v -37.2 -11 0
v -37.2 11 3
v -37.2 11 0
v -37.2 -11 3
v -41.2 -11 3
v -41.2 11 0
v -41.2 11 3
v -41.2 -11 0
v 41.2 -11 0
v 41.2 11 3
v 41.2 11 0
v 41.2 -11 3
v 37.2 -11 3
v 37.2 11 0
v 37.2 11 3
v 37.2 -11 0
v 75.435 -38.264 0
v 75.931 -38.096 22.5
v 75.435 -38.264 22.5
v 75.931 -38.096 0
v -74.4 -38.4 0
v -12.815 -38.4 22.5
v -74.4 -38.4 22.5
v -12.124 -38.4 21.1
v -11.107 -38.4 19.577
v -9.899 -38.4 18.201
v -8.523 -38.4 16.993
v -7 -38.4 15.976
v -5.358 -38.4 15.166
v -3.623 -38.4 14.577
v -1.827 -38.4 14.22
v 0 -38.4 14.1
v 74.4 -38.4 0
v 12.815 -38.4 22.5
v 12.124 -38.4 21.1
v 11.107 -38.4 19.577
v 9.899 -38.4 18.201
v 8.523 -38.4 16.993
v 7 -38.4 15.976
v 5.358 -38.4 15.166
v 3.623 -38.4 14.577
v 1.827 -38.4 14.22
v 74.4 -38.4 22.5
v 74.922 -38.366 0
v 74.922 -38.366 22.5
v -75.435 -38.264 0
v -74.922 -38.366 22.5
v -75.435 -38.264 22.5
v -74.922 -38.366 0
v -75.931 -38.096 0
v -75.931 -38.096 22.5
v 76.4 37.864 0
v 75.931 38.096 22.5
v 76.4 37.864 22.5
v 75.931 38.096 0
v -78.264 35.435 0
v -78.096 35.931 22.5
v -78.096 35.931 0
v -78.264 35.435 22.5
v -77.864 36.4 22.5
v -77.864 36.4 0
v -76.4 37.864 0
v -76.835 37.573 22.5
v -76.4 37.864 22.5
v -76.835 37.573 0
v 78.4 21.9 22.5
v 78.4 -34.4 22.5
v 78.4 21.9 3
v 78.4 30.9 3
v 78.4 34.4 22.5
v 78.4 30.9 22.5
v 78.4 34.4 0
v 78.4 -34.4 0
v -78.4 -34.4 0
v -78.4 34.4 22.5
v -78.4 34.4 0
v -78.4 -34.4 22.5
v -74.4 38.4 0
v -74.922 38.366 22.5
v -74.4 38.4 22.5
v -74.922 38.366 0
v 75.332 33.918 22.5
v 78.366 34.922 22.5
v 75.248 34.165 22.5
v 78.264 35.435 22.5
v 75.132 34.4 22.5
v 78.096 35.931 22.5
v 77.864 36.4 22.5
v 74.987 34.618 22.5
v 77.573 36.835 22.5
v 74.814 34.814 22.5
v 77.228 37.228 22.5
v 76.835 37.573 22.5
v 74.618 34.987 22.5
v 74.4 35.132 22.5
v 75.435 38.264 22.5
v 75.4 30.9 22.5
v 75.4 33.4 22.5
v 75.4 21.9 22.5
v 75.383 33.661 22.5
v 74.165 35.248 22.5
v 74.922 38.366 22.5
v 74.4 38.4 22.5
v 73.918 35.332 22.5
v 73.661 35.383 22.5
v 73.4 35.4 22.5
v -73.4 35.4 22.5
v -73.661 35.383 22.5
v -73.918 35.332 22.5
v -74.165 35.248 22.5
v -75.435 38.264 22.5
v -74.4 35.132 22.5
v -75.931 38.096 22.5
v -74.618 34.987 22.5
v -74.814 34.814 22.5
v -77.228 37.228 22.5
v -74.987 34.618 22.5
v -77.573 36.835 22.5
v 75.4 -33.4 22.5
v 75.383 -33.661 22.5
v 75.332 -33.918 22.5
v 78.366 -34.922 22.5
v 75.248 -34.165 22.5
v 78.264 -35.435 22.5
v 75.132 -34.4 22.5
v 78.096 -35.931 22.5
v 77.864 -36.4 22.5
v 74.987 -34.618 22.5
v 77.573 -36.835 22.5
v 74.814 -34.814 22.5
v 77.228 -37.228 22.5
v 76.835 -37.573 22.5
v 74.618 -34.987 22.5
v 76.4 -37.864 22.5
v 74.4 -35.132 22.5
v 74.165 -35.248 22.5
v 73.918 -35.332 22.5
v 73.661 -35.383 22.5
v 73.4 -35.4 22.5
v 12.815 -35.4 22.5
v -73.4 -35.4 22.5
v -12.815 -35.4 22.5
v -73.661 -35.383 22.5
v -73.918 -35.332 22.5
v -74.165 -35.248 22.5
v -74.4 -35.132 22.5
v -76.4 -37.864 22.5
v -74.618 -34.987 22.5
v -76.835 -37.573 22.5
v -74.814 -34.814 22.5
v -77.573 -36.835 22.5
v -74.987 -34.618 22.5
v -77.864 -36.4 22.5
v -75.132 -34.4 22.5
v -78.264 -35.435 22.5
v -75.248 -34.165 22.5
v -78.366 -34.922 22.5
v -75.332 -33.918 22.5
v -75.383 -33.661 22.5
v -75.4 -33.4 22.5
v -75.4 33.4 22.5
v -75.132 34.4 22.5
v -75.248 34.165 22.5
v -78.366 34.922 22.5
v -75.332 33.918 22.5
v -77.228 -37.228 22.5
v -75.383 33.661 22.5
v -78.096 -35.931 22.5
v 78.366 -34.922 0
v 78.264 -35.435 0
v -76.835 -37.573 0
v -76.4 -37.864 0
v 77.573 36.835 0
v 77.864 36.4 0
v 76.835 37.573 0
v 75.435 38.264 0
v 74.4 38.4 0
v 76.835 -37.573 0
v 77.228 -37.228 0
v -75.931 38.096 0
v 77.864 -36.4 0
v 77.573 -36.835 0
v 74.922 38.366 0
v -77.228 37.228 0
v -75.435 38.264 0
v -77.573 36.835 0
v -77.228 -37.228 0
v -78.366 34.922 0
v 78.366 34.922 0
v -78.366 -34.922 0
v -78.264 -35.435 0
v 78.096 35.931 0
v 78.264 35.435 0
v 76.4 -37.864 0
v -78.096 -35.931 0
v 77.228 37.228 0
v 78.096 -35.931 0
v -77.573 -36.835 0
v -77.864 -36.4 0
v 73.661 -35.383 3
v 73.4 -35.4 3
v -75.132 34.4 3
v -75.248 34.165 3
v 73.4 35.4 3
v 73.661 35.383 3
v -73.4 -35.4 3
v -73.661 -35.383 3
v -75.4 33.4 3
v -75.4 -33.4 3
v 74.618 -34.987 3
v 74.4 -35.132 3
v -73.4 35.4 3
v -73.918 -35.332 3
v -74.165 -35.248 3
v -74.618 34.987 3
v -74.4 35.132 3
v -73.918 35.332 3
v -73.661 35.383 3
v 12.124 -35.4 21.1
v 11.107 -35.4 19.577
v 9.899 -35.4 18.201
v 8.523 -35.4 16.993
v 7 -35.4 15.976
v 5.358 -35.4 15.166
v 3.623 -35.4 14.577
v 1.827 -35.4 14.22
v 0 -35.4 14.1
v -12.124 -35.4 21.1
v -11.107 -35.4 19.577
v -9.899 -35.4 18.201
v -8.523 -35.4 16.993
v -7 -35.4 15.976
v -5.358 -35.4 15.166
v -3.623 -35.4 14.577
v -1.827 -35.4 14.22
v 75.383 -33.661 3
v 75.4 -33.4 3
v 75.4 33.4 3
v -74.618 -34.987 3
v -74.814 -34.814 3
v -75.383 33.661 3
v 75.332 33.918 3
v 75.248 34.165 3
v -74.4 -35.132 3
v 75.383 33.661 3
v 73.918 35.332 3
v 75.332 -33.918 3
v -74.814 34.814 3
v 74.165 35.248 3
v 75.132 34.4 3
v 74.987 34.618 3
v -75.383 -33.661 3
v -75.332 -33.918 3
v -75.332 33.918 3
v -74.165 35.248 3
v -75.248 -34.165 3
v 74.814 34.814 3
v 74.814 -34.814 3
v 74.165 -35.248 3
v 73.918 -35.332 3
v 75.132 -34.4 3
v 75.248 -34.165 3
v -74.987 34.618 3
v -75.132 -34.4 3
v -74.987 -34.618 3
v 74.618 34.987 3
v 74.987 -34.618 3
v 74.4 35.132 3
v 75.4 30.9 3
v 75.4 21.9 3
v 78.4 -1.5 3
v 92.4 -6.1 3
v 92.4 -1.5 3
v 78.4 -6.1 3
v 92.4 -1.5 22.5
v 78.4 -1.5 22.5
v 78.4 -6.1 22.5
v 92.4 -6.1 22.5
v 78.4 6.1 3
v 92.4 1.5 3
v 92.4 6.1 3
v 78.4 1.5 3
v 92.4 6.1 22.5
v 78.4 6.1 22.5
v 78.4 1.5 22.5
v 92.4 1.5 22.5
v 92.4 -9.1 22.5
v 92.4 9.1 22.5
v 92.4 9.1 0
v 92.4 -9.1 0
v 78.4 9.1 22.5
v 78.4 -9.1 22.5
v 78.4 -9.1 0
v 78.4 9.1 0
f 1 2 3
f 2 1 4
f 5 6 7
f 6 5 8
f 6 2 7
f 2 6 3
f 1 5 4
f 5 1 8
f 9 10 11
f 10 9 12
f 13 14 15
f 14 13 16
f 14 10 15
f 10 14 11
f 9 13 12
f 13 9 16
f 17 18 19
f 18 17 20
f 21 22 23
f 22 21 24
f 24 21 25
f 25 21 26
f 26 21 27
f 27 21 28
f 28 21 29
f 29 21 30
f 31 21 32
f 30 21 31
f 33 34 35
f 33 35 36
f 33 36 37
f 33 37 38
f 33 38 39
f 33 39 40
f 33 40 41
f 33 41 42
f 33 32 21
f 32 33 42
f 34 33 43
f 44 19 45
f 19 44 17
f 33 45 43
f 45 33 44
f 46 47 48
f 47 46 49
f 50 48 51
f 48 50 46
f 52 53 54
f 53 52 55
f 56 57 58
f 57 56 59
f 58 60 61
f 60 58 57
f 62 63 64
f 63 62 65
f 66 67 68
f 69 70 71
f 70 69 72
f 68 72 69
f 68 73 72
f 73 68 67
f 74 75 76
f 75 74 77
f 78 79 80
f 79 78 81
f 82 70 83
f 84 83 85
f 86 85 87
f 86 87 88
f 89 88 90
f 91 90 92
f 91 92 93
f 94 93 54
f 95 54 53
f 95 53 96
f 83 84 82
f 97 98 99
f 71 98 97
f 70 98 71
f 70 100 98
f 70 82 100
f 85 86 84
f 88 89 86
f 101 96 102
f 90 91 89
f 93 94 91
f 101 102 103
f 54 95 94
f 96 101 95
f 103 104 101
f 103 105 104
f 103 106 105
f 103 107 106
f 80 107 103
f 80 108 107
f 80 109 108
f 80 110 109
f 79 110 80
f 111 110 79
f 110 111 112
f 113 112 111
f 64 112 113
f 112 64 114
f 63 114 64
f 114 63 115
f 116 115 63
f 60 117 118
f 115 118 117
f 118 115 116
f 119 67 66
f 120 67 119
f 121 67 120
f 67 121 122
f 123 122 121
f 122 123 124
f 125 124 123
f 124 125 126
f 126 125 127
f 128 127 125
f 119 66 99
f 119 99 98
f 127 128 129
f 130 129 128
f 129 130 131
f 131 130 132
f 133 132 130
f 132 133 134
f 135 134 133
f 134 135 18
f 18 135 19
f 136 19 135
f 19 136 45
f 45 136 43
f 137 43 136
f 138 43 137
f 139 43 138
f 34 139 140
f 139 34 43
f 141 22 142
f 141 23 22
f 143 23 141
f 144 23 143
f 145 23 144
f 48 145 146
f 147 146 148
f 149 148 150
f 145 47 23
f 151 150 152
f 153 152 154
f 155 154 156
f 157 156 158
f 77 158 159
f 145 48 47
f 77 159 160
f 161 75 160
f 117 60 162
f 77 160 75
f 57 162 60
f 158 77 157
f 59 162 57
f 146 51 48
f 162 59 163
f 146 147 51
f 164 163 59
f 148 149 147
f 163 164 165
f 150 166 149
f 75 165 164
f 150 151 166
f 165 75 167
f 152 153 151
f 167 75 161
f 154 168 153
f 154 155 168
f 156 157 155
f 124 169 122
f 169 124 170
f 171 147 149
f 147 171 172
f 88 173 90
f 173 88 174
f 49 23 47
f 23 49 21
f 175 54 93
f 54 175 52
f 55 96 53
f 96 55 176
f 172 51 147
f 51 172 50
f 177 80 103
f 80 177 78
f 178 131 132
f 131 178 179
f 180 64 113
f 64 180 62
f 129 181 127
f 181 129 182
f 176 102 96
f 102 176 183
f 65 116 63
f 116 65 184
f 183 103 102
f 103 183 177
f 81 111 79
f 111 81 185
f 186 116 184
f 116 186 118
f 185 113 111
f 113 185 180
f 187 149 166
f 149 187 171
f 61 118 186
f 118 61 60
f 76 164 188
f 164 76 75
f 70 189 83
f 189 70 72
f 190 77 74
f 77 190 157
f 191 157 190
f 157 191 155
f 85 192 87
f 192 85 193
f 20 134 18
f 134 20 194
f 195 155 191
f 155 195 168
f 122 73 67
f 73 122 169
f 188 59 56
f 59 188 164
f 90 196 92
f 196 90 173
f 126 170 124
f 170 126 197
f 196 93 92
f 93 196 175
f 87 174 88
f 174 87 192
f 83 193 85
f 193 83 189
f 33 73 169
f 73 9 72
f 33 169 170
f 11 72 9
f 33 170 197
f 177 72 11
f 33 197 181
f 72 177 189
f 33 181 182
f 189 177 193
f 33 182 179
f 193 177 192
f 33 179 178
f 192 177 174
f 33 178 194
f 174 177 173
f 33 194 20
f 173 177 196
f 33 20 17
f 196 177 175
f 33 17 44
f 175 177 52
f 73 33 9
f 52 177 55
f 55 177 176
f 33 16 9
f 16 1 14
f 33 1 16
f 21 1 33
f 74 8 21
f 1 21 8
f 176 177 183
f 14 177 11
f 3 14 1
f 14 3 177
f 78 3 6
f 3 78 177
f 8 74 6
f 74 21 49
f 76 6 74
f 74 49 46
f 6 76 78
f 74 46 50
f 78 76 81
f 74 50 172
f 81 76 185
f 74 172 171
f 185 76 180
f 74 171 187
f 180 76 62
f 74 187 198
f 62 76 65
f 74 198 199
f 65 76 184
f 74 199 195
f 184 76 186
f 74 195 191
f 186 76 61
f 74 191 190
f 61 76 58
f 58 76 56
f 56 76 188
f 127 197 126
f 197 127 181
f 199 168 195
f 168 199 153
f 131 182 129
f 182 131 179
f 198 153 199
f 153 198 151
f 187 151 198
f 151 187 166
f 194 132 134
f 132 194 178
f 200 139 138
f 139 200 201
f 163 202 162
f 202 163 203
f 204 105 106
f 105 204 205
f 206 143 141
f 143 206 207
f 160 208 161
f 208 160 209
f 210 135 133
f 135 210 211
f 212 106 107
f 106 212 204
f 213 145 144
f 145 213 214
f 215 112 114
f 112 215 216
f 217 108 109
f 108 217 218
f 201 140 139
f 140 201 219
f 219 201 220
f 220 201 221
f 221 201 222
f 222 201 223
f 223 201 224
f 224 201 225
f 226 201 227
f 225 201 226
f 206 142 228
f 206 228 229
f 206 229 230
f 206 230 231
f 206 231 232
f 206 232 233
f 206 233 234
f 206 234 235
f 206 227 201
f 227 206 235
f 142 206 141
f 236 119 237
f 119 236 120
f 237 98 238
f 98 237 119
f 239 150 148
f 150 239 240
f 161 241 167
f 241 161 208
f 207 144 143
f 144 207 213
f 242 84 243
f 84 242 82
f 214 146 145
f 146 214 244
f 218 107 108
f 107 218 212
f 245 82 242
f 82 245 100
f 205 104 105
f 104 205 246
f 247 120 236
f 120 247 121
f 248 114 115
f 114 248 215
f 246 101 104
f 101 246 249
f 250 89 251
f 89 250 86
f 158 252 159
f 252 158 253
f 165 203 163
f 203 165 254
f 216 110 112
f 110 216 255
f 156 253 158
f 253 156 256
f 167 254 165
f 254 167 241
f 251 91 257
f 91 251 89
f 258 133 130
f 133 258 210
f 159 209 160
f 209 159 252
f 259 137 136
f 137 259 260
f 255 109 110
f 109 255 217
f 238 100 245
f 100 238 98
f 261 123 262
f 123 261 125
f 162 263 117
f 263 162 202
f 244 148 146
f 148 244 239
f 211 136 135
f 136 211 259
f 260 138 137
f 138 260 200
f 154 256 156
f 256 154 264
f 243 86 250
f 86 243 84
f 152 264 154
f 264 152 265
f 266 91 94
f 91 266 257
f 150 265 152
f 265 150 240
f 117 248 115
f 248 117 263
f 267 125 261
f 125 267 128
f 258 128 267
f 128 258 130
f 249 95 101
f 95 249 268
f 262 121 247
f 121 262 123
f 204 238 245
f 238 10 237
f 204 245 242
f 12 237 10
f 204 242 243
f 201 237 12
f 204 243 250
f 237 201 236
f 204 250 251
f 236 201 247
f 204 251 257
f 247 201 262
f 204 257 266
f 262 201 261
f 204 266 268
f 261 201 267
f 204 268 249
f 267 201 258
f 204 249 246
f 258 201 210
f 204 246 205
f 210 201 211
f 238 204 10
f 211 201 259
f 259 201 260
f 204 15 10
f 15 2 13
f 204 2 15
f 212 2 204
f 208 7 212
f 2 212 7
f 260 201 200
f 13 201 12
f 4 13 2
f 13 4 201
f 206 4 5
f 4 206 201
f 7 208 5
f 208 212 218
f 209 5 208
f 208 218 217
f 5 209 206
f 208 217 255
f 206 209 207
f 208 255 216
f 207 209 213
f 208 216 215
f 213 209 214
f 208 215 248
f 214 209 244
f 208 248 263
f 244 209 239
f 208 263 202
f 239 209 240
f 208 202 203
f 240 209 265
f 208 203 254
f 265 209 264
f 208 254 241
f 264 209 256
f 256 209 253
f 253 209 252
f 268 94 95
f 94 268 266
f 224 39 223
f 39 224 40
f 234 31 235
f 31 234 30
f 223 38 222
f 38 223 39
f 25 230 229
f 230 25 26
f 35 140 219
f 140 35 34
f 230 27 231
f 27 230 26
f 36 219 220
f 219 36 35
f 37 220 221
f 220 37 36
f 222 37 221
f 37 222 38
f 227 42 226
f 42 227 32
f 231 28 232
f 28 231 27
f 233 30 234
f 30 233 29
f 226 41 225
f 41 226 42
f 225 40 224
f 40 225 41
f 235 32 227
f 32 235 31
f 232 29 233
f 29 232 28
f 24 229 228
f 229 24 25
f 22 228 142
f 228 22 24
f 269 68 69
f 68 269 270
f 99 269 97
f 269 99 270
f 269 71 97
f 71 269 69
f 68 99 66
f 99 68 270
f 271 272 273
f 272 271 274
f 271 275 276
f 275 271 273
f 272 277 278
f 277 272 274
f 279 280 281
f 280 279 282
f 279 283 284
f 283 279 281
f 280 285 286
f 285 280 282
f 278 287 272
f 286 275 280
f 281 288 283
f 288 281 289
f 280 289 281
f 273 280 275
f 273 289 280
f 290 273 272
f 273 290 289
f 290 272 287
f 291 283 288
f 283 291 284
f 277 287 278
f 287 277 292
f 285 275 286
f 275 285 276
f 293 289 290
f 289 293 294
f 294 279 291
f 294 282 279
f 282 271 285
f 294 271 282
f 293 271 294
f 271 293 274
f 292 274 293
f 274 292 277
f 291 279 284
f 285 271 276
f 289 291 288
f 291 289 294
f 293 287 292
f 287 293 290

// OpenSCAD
// ============================================================
// 0-Coast Portable Power Caddy
// Parametric sled for a USB-C PD power bank, parked behind a
// Make Noise 0-Coast. Prints flat, no supports.
//
// Set the three bank_* dimensions to YOUR power bank, render
// (F6), export STL. Everything else derives sensibly.
// ============================================================

/* ---------- measure your power bank (mm) ---------- */
bank_w = 150;   // longest side (lies left-right in the sled)
bank_d = 70;    // depth, front-to-back
bank_h = 26;    // thickness of the bank lying flat

/* ---------- fit and structure ---------- */
clearance   = 0.8;   // total slop around the bank; 0.8 suits FDM
wall        = 3;     // wall thickness
base_t      = 3;     // floor thickness
wall_frac   = 0.75;  // wall height as a fraction of bank_h (open top)
corner_r    = 4;     // outer corner radius

/* ---------- features ---------- */
thumb_r        = 14;   // front thumb-scoop radius (grab the bank out)
cable_slot_w   = 9;    // exit slot in the right wall for the barrel cable
velcro_w       = 22;   // velcro strap width (slot cut in the base)
velcro_slot_t  = 4;    // slot thickness for the strap to pass through
comb_slot_w    = 4.6;  // strain-relief comb: slot width, fits ~4 mm cable
comb_depth     = 14;   // how far the comb sticks out from the right wall

$fn = 48;

/* ---------- derived ---------- */
cav_w  = bank_w + clearance;
cav_d  = bank_d + clearance;
out_w  = cav_w + 2 * wall;
out_d  = cav_d + 2 * wall;
wall_h = max(10, bank_h * wall_frac);
out_h  = base_t + wall_h;

// XY-rounded box, centered in X/Y, sitting on Z=0
module rounded_box(w, d, h, r) {
    linear_extrude(h)
        offset(r = r) offset(r = -r)
            square([w, d], center = true);
}

module caddy_body() {
    difference() {
        rounded_box(out_w, out_d, out_h, corner_r);

        // bank cavity
        translate([0, 0, base_t])
            rounded_box(cav_w, cav_d, out_h, corner_r / 2);

        // front thumb scoop, centered on the front wall
        translate([0, -out_d / 2, base_t + wall_h + thumb_r * 0.4])
            rotate([-90, 0, 0])
                cylinder(r = thumb_r, h = wall * 3, center = true);

        // cable exit: vertical slot through the right wall, near the back
        translate([out_w / 2 - wall, out_d / 2 - wall - cable_slot_w * 1.5,
                   base_t])
            cube([wall * 2, cable_slot_w, out_h]);

        // two velcro slots through the base; one strap threads down
        // one slot and up the other, wrapping left-right over the bank
        for (x = [-out_w / 4, out_w / 4])
            translate([x - velcro_slot_t / 2, -velcro_w / 2, -1])
                cube([velcro_slot_t, velcro_w, base_t + 2]);
    }
}

// Strain-relief comb on the exterior right wall: weave the trigger
// cable through so a yank loads the caddy, not the 0-Coast's jack.
module strain_comb() {
    comb_w = comb_slot_w * 2 + 3 * wall;  // two slots, three teeth
    translate([out_w / 2, -comb_w / 2, 0])
        difference() {
            cube([comb_depth, comb_w, out_h]);
            for (i = [0, 1])
                translate([-1, wall + i * (comb_slot_w + wall),
                           base_t])
                    cube([comb_depth + 2, comb_slot_w, out_h]);
        }
}

caddy_body();
strain_comb();
